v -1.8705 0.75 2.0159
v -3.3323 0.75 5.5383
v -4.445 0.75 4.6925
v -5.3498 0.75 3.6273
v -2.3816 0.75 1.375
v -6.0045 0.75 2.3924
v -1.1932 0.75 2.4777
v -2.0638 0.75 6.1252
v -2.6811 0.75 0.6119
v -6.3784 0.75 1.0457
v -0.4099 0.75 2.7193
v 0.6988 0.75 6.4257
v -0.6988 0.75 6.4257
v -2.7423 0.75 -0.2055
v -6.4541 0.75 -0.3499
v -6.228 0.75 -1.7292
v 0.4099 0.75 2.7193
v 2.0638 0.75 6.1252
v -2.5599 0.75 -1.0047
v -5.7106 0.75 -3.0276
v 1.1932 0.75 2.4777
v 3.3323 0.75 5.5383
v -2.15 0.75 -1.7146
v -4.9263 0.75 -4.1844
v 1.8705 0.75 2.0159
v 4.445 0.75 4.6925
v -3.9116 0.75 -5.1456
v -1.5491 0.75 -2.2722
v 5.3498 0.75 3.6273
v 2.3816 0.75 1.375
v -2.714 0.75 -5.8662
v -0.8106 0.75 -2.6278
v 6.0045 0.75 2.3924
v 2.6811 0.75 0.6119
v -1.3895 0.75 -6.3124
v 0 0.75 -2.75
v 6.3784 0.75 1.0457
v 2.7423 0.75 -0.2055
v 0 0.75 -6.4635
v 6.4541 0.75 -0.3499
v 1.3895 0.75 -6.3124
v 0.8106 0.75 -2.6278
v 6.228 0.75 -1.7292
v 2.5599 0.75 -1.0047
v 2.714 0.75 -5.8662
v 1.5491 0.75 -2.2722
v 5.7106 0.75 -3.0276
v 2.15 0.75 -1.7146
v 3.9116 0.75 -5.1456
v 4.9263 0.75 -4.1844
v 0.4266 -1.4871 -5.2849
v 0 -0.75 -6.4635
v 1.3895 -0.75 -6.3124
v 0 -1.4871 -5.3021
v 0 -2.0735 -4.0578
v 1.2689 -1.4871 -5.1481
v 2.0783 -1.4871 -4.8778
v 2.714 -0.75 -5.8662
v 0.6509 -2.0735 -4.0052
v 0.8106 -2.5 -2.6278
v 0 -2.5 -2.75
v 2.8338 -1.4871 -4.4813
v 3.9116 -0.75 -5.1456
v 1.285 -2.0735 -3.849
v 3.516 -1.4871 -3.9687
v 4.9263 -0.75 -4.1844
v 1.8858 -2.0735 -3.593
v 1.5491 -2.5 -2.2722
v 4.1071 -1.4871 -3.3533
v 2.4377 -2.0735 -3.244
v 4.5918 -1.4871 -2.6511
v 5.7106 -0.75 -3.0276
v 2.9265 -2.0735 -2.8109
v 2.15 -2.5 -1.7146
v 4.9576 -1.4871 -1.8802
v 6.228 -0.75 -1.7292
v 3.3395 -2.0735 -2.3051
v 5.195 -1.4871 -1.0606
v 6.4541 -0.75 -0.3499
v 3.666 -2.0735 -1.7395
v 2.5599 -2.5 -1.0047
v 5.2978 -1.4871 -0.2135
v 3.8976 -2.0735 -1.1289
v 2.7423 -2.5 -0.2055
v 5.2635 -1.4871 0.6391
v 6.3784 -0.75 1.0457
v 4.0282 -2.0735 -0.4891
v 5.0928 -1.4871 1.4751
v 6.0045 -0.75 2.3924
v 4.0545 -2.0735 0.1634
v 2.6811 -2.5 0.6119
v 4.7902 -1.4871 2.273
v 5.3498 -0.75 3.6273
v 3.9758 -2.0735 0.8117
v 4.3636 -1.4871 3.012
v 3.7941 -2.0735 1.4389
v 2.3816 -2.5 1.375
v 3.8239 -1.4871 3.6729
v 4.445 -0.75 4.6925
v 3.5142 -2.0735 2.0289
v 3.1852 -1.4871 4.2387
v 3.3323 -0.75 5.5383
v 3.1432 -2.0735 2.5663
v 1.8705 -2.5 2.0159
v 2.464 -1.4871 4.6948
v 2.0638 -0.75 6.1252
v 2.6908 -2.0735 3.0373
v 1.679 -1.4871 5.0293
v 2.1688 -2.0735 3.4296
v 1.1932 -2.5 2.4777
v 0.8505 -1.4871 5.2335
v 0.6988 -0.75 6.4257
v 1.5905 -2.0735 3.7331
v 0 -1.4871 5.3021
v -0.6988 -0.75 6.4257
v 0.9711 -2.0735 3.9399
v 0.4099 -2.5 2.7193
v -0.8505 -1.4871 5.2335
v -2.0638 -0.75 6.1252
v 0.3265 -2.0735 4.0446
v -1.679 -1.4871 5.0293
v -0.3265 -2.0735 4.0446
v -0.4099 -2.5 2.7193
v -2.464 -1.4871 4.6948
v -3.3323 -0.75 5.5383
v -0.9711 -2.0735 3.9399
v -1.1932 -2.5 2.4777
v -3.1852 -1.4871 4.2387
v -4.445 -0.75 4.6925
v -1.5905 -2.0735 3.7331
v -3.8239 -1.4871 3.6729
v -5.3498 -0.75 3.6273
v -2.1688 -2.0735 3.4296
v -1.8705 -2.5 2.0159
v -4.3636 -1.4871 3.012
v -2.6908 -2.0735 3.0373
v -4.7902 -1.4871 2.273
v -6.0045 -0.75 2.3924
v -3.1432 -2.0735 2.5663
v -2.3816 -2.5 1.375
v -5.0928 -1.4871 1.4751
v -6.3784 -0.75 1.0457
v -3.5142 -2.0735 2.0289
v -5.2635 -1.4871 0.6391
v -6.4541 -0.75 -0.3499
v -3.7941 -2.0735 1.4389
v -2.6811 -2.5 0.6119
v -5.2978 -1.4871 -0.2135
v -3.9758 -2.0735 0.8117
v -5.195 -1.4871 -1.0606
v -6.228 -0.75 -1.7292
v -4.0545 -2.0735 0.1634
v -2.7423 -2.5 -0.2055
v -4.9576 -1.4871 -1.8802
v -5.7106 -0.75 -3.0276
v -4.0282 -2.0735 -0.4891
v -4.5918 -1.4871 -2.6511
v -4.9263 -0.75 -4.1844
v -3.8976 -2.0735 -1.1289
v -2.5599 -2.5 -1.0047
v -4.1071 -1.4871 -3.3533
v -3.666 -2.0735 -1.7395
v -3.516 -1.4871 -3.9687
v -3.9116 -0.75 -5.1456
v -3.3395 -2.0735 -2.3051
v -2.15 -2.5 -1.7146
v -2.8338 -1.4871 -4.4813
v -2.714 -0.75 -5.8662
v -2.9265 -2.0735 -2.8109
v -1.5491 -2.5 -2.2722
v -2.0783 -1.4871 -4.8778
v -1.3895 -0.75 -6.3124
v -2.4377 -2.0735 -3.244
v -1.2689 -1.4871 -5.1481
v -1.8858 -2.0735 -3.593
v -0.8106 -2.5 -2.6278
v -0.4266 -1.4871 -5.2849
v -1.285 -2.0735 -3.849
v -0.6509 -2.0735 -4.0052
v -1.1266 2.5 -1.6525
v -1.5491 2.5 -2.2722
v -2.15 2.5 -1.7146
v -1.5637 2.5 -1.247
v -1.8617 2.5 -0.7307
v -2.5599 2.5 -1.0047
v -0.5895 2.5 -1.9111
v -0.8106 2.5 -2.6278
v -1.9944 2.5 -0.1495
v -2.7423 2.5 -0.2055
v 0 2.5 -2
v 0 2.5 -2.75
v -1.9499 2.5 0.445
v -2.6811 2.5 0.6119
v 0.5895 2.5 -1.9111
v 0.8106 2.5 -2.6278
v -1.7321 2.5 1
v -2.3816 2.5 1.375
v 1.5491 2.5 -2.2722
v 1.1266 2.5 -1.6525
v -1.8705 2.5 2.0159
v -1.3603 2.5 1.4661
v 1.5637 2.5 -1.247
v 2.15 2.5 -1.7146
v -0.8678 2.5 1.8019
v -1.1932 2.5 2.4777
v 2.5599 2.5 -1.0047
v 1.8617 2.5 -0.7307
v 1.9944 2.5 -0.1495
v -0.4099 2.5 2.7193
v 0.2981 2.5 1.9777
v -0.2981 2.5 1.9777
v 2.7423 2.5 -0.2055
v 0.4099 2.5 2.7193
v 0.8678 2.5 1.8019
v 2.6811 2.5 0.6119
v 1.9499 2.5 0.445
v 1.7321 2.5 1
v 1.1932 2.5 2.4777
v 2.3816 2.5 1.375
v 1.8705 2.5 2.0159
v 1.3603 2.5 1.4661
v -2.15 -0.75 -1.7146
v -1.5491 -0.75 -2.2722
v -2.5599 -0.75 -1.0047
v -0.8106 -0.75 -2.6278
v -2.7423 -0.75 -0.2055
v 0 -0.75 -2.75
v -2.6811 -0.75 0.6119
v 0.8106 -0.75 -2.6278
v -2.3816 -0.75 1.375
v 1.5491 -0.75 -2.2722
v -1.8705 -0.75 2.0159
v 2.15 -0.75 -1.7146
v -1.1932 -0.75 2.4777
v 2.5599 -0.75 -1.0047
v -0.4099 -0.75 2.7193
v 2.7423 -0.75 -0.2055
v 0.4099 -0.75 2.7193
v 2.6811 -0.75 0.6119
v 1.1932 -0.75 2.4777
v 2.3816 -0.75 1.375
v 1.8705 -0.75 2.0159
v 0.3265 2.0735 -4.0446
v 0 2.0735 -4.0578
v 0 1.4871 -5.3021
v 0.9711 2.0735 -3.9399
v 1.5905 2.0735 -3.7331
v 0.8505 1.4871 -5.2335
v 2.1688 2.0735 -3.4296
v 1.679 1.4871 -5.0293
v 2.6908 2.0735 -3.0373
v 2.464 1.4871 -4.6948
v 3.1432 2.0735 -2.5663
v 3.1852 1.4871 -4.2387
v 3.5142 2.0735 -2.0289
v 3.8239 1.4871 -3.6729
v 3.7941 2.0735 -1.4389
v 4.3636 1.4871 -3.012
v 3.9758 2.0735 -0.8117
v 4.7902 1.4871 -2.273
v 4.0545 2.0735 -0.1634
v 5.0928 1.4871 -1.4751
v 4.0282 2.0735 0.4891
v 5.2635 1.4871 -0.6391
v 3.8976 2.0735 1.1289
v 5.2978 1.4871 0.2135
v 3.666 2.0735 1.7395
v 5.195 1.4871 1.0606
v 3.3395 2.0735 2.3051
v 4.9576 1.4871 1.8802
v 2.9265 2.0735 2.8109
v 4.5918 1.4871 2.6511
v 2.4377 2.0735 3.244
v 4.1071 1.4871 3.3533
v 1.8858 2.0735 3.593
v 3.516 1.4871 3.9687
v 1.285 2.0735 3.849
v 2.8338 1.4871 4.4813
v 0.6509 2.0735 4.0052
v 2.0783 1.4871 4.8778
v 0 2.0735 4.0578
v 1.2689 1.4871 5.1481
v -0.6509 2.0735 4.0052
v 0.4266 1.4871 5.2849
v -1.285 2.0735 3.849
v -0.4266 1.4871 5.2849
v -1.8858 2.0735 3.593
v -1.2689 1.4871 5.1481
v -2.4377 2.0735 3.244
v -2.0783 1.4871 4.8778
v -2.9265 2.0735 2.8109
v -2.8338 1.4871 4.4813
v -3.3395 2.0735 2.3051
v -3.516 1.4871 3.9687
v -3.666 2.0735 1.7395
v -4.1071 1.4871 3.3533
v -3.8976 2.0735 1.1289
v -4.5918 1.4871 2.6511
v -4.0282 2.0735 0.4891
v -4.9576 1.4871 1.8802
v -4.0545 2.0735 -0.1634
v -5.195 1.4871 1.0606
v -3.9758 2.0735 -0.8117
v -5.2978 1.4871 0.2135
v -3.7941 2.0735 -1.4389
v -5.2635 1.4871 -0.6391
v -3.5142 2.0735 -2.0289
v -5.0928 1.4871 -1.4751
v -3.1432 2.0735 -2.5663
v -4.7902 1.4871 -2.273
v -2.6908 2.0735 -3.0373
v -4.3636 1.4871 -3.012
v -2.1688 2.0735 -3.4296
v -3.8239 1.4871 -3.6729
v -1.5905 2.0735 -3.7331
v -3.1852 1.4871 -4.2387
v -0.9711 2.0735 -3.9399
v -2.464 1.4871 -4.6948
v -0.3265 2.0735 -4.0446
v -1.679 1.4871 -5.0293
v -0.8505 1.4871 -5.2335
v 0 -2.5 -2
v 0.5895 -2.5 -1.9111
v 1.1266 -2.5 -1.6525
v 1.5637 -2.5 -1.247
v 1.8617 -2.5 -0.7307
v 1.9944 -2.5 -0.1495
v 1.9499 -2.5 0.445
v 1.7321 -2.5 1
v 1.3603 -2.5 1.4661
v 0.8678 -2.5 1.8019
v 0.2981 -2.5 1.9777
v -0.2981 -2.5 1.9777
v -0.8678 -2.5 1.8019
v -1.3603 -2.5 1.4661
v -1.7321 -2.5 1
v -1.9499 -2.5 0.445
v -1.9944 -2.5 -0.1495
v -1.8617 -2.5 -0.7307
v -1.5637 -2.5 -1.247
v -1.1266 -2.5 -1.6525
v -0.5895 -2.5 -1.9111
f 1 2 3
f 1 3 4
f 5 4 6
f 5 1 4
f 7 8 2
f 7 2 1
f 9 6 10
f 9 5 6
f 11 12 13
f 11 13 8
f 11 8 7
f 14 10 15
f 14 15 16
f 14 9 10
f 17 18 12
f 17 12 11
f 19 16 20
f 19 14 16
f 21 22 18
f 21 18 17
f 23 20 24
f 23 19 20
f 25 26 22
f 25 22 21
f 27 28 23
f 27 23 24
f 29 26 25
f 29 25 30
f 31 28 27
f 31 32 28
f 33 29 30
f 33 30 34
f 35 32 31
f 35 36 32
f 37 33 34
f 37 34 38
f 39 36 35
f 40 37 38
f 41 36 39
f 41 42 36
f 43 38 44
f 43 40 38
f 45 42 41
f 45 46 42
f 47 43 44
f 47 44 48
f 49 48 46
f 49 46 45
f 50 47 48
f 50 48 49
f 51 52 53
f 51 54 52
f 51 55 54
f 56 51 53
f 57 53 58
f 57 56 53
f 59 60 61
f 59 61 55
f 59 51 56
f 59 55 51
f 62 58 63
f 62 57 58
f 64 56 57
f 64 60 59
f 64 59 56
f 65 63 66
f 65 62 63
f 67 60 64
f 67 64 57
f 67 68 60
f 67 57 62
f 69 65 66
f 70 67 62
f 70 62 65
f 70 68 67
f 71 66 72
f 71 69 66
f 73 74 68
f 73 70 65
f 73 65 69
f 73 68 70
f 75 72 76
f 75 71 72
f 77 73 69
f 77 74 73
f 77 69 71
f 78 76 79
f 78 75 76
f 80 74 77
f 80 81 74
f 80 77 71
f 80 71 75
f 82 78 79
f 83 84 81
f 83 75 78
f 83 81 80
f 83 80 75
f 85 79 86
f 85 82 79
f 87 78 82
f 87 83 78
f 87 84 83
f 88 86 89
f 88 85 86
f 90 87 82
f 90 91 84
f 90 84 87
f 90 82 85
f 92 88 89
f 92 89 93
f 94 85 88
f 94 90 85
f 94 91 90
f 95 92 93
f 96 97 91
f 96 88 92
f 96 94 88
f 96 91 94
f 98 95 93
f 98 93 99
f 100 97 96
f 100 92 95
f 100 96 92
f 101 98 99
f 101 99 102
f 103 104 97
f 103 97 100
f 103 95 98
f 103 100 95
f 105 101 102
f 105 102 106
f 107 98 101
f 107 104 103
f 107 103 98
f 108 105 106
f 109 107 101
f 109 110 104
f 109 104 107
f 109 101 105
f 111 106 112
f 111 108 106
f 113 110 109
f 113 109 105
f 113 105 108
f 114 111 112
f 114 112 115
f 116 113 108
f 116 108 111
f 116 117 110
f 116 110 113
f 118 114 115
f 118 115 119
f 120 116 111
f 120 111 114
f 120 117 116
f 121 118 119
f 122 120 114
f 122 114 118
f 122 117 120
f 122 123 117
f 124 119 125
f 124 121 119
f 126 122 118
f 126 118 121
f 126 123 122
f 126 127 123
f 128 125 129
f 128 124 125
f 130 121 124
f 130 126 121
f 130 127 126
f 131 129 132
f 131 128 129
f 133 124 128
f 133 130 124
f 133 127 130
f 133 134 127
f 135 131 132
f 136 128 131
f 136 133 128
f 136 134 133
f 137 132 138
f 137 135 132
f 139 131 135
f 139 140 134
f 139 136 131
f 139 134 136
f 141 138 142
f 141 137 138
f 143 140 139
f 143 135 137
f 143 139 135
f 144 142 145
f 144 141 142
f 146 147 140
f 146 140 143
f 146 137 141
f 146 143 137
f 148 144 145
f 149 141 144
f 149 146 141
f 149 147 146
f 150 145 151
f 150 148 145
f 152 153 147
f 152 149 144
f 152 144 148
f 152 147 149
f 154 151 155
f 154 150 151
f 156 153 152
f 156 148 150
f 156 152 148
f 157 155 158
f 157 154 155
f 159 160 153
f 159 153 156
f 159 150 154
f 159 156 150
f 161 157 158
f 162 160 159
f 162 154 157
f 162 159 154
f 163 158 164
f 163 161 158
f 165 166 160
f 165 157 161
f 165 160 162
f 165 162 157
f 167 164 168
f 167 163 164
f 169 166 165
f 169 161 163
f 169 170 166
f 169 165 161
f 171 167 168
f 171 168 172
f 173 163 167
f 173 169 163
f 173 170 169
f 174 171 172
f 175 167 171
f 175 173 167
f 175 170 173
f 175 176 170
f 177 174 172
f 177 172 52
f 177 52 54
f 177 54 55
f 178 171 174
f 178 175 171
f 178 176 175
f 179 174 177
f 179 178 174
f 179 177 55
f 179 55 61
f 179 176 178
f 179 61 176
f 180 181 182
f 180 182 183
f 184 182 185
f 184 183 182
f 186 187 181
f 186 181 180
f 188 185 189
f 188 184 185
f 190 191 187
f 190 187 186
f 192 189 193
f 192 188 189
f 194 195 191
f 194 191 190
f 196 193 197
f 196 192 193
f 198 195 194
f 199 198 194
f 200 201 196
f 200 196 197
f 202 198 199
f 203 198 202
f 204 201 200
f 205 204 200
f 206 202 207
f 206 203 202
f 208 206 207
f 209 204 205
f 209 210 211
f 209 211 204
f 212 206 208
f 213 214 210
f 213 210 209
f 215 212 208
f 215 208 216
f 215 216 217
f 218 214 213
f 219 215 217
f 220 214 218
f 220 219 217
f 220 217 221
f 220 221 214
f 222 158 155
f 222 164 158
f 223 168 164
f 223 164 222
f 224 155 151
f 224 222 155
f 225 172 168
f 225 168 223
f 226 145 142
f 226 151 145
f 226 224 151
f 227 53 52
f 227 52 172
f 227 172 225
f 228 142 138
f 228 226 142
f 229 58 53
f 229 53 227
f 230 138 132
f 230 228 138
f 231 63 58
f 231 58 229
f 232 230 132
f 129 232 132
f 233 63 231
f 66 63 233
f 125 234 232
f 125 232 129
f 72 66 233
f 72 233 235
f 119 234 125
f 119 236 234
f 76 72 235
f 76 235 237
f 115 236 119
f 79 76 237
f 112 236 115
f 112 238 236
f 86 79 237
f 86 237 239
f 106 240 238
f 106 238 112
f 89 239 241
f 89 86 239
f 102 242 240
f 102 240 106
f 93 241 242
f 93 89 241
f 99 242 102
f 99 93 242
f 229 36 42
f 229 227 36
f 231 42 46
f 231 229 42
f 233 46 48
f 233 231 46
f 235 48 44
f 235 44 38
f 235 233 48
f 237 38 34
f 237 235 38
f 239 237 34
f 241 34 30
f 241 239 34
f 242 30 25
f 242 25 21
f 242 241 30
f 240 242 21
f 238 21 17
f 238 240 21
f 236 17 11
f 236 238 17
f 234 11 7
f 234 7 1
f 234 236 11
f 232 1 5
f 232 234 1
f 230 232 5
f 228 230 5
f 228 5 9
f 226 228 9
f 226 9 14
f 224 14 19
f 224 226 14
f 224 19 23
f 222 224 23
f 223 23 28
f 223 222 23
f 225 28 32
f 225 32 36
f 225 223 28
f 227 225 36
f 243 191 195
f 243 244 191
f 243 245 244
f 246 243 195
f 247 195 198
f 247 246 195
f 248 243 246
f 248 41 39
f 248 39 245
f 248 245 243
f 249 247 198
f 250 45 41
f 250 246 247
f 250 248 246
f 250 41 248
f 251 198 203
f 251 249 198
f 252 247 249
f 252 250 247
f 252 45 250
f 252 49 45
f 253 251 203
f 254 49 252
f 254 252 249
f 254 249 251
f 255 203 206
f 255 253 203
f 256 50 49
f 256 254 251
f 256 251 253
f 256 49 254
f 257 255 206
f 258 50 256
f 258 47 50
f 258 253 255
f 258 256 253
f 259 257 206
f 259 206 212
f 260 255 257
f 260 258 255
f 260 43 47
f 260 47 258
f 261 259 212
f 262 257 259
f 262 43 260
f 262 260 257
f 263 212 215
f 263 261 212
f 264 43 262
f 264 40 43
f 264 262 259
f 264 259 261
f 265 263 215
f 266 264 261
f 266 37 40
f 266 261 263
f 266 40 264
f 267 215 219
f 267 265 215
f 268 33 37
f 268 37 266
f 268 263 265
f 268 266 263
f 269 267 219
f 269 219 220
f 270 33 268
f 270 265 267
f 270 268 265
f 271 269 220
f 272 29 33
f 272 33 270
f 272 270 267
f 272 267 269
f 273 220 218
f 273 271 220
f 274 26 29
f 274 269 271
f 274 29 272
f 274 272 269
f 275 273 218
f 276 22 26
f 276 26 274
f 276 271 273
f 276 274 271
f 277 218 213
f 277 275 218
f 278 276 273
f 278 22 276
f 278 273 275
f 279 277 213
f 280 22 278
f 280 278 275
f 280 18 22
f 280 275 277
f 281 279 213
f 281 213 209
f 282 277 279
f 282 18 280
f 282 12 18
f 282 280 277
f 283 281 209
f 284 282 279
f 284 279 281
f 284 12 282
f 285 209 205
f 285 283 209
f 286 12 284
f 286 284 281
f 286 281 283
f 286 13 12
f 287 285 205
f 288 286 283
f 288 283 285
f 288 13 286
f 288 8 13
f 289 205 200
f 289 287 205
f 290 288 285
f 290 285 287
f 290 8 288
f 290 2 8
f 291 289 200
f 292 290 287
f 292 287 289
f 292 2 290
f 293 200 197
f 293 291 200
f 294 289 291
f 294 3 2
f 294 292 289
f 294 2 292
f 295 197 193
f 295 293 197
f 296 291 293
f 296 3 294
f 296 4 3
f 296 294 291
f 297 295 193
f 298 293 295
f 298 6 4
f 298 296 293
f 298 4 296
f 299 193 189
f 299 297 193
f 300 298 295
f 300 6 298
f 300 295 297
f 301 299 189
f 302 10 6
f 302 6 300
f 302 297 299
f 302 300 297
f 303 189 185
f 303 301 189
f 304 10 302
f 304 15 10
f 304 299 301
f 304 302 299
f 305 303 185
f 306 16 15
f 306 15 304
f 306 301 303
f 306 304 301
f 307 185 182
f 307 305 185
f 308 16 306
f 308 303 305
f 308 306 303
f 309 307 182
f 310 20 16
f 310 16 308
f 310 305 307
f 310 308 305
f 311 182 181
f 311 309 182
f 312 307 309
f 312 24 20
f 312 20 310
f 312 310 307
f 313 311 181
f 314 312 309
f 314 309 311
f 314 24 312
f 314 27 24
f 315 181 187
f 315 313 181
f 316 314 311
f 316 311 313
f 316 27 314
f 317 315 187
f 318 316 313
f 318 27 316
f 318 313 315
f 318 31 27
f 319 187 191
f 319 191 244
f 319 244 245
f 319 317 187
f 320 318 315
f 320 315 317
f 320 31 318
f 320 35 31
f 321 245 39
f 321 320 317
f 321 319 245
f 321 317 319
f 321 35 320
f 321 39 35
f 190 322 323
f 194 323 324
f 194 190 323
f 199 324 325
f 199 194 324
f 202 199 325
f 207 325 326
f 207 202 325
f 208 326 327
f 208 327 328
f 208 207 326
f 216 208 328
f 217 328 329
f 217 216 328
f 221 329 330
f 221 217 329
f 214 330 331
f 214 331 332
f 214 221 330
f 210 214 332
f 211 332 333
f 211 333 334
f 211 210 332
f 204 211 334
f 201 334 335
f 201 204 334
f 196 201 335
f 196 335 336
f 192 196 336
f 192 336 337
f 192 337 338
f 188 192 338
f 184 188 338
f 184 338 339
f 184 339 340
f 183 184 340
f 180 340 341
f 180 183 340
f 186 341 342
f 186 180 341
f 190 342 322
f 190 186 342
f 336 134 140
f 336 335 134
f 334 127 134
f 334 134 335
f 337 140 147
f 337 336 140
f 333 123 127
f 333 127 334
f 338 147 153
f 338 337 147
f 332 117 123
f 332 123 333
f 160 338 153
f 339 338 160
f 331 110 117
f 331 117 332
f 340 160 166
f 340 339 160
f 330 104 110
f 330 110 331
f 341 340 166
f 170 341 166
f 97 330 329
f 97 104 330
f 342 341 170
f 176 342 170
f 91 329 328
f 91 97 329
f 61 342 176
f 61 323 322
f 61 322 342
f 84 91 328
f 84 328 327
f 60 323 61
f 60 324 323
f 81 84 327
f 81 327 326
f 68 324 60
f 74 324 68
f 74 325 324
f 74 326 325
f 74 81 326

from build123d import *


with BuildPart() as part:
    # 草图2 → 旋转1 (revolve)
    with BuildSketch(Plane(origin=(0, 0, 0), x_dir=(0, 0, -1), z_dir=(1, 0, 0))):
        with BuildLine():
            Line((6.463548925, 0.75), (2.75, 0.75))
            Line((2.75, 0.75), (2.75, -0.75))
            Line((2.75, -0.75), (6.463548925, -0.75))
            ThreePointArc((6.463548925, -0.75), (4.689135949, -1.799773377), (2.75, -2.5))
            Line((2.75, -2.5), (2, -2.5))
            Line((2, -2.5), (2, 2.5))
            Line((2, 2.5), (2.75, 2.5))
            ThreePointArc((2.75, 2.5), (4.689135949, 1.799773377), (6.463548925, 0.75))
        make_face()
    revolve(axis=Axis((0, 32.338552752, 0), (0, -1, 0)))


solid = part.part
